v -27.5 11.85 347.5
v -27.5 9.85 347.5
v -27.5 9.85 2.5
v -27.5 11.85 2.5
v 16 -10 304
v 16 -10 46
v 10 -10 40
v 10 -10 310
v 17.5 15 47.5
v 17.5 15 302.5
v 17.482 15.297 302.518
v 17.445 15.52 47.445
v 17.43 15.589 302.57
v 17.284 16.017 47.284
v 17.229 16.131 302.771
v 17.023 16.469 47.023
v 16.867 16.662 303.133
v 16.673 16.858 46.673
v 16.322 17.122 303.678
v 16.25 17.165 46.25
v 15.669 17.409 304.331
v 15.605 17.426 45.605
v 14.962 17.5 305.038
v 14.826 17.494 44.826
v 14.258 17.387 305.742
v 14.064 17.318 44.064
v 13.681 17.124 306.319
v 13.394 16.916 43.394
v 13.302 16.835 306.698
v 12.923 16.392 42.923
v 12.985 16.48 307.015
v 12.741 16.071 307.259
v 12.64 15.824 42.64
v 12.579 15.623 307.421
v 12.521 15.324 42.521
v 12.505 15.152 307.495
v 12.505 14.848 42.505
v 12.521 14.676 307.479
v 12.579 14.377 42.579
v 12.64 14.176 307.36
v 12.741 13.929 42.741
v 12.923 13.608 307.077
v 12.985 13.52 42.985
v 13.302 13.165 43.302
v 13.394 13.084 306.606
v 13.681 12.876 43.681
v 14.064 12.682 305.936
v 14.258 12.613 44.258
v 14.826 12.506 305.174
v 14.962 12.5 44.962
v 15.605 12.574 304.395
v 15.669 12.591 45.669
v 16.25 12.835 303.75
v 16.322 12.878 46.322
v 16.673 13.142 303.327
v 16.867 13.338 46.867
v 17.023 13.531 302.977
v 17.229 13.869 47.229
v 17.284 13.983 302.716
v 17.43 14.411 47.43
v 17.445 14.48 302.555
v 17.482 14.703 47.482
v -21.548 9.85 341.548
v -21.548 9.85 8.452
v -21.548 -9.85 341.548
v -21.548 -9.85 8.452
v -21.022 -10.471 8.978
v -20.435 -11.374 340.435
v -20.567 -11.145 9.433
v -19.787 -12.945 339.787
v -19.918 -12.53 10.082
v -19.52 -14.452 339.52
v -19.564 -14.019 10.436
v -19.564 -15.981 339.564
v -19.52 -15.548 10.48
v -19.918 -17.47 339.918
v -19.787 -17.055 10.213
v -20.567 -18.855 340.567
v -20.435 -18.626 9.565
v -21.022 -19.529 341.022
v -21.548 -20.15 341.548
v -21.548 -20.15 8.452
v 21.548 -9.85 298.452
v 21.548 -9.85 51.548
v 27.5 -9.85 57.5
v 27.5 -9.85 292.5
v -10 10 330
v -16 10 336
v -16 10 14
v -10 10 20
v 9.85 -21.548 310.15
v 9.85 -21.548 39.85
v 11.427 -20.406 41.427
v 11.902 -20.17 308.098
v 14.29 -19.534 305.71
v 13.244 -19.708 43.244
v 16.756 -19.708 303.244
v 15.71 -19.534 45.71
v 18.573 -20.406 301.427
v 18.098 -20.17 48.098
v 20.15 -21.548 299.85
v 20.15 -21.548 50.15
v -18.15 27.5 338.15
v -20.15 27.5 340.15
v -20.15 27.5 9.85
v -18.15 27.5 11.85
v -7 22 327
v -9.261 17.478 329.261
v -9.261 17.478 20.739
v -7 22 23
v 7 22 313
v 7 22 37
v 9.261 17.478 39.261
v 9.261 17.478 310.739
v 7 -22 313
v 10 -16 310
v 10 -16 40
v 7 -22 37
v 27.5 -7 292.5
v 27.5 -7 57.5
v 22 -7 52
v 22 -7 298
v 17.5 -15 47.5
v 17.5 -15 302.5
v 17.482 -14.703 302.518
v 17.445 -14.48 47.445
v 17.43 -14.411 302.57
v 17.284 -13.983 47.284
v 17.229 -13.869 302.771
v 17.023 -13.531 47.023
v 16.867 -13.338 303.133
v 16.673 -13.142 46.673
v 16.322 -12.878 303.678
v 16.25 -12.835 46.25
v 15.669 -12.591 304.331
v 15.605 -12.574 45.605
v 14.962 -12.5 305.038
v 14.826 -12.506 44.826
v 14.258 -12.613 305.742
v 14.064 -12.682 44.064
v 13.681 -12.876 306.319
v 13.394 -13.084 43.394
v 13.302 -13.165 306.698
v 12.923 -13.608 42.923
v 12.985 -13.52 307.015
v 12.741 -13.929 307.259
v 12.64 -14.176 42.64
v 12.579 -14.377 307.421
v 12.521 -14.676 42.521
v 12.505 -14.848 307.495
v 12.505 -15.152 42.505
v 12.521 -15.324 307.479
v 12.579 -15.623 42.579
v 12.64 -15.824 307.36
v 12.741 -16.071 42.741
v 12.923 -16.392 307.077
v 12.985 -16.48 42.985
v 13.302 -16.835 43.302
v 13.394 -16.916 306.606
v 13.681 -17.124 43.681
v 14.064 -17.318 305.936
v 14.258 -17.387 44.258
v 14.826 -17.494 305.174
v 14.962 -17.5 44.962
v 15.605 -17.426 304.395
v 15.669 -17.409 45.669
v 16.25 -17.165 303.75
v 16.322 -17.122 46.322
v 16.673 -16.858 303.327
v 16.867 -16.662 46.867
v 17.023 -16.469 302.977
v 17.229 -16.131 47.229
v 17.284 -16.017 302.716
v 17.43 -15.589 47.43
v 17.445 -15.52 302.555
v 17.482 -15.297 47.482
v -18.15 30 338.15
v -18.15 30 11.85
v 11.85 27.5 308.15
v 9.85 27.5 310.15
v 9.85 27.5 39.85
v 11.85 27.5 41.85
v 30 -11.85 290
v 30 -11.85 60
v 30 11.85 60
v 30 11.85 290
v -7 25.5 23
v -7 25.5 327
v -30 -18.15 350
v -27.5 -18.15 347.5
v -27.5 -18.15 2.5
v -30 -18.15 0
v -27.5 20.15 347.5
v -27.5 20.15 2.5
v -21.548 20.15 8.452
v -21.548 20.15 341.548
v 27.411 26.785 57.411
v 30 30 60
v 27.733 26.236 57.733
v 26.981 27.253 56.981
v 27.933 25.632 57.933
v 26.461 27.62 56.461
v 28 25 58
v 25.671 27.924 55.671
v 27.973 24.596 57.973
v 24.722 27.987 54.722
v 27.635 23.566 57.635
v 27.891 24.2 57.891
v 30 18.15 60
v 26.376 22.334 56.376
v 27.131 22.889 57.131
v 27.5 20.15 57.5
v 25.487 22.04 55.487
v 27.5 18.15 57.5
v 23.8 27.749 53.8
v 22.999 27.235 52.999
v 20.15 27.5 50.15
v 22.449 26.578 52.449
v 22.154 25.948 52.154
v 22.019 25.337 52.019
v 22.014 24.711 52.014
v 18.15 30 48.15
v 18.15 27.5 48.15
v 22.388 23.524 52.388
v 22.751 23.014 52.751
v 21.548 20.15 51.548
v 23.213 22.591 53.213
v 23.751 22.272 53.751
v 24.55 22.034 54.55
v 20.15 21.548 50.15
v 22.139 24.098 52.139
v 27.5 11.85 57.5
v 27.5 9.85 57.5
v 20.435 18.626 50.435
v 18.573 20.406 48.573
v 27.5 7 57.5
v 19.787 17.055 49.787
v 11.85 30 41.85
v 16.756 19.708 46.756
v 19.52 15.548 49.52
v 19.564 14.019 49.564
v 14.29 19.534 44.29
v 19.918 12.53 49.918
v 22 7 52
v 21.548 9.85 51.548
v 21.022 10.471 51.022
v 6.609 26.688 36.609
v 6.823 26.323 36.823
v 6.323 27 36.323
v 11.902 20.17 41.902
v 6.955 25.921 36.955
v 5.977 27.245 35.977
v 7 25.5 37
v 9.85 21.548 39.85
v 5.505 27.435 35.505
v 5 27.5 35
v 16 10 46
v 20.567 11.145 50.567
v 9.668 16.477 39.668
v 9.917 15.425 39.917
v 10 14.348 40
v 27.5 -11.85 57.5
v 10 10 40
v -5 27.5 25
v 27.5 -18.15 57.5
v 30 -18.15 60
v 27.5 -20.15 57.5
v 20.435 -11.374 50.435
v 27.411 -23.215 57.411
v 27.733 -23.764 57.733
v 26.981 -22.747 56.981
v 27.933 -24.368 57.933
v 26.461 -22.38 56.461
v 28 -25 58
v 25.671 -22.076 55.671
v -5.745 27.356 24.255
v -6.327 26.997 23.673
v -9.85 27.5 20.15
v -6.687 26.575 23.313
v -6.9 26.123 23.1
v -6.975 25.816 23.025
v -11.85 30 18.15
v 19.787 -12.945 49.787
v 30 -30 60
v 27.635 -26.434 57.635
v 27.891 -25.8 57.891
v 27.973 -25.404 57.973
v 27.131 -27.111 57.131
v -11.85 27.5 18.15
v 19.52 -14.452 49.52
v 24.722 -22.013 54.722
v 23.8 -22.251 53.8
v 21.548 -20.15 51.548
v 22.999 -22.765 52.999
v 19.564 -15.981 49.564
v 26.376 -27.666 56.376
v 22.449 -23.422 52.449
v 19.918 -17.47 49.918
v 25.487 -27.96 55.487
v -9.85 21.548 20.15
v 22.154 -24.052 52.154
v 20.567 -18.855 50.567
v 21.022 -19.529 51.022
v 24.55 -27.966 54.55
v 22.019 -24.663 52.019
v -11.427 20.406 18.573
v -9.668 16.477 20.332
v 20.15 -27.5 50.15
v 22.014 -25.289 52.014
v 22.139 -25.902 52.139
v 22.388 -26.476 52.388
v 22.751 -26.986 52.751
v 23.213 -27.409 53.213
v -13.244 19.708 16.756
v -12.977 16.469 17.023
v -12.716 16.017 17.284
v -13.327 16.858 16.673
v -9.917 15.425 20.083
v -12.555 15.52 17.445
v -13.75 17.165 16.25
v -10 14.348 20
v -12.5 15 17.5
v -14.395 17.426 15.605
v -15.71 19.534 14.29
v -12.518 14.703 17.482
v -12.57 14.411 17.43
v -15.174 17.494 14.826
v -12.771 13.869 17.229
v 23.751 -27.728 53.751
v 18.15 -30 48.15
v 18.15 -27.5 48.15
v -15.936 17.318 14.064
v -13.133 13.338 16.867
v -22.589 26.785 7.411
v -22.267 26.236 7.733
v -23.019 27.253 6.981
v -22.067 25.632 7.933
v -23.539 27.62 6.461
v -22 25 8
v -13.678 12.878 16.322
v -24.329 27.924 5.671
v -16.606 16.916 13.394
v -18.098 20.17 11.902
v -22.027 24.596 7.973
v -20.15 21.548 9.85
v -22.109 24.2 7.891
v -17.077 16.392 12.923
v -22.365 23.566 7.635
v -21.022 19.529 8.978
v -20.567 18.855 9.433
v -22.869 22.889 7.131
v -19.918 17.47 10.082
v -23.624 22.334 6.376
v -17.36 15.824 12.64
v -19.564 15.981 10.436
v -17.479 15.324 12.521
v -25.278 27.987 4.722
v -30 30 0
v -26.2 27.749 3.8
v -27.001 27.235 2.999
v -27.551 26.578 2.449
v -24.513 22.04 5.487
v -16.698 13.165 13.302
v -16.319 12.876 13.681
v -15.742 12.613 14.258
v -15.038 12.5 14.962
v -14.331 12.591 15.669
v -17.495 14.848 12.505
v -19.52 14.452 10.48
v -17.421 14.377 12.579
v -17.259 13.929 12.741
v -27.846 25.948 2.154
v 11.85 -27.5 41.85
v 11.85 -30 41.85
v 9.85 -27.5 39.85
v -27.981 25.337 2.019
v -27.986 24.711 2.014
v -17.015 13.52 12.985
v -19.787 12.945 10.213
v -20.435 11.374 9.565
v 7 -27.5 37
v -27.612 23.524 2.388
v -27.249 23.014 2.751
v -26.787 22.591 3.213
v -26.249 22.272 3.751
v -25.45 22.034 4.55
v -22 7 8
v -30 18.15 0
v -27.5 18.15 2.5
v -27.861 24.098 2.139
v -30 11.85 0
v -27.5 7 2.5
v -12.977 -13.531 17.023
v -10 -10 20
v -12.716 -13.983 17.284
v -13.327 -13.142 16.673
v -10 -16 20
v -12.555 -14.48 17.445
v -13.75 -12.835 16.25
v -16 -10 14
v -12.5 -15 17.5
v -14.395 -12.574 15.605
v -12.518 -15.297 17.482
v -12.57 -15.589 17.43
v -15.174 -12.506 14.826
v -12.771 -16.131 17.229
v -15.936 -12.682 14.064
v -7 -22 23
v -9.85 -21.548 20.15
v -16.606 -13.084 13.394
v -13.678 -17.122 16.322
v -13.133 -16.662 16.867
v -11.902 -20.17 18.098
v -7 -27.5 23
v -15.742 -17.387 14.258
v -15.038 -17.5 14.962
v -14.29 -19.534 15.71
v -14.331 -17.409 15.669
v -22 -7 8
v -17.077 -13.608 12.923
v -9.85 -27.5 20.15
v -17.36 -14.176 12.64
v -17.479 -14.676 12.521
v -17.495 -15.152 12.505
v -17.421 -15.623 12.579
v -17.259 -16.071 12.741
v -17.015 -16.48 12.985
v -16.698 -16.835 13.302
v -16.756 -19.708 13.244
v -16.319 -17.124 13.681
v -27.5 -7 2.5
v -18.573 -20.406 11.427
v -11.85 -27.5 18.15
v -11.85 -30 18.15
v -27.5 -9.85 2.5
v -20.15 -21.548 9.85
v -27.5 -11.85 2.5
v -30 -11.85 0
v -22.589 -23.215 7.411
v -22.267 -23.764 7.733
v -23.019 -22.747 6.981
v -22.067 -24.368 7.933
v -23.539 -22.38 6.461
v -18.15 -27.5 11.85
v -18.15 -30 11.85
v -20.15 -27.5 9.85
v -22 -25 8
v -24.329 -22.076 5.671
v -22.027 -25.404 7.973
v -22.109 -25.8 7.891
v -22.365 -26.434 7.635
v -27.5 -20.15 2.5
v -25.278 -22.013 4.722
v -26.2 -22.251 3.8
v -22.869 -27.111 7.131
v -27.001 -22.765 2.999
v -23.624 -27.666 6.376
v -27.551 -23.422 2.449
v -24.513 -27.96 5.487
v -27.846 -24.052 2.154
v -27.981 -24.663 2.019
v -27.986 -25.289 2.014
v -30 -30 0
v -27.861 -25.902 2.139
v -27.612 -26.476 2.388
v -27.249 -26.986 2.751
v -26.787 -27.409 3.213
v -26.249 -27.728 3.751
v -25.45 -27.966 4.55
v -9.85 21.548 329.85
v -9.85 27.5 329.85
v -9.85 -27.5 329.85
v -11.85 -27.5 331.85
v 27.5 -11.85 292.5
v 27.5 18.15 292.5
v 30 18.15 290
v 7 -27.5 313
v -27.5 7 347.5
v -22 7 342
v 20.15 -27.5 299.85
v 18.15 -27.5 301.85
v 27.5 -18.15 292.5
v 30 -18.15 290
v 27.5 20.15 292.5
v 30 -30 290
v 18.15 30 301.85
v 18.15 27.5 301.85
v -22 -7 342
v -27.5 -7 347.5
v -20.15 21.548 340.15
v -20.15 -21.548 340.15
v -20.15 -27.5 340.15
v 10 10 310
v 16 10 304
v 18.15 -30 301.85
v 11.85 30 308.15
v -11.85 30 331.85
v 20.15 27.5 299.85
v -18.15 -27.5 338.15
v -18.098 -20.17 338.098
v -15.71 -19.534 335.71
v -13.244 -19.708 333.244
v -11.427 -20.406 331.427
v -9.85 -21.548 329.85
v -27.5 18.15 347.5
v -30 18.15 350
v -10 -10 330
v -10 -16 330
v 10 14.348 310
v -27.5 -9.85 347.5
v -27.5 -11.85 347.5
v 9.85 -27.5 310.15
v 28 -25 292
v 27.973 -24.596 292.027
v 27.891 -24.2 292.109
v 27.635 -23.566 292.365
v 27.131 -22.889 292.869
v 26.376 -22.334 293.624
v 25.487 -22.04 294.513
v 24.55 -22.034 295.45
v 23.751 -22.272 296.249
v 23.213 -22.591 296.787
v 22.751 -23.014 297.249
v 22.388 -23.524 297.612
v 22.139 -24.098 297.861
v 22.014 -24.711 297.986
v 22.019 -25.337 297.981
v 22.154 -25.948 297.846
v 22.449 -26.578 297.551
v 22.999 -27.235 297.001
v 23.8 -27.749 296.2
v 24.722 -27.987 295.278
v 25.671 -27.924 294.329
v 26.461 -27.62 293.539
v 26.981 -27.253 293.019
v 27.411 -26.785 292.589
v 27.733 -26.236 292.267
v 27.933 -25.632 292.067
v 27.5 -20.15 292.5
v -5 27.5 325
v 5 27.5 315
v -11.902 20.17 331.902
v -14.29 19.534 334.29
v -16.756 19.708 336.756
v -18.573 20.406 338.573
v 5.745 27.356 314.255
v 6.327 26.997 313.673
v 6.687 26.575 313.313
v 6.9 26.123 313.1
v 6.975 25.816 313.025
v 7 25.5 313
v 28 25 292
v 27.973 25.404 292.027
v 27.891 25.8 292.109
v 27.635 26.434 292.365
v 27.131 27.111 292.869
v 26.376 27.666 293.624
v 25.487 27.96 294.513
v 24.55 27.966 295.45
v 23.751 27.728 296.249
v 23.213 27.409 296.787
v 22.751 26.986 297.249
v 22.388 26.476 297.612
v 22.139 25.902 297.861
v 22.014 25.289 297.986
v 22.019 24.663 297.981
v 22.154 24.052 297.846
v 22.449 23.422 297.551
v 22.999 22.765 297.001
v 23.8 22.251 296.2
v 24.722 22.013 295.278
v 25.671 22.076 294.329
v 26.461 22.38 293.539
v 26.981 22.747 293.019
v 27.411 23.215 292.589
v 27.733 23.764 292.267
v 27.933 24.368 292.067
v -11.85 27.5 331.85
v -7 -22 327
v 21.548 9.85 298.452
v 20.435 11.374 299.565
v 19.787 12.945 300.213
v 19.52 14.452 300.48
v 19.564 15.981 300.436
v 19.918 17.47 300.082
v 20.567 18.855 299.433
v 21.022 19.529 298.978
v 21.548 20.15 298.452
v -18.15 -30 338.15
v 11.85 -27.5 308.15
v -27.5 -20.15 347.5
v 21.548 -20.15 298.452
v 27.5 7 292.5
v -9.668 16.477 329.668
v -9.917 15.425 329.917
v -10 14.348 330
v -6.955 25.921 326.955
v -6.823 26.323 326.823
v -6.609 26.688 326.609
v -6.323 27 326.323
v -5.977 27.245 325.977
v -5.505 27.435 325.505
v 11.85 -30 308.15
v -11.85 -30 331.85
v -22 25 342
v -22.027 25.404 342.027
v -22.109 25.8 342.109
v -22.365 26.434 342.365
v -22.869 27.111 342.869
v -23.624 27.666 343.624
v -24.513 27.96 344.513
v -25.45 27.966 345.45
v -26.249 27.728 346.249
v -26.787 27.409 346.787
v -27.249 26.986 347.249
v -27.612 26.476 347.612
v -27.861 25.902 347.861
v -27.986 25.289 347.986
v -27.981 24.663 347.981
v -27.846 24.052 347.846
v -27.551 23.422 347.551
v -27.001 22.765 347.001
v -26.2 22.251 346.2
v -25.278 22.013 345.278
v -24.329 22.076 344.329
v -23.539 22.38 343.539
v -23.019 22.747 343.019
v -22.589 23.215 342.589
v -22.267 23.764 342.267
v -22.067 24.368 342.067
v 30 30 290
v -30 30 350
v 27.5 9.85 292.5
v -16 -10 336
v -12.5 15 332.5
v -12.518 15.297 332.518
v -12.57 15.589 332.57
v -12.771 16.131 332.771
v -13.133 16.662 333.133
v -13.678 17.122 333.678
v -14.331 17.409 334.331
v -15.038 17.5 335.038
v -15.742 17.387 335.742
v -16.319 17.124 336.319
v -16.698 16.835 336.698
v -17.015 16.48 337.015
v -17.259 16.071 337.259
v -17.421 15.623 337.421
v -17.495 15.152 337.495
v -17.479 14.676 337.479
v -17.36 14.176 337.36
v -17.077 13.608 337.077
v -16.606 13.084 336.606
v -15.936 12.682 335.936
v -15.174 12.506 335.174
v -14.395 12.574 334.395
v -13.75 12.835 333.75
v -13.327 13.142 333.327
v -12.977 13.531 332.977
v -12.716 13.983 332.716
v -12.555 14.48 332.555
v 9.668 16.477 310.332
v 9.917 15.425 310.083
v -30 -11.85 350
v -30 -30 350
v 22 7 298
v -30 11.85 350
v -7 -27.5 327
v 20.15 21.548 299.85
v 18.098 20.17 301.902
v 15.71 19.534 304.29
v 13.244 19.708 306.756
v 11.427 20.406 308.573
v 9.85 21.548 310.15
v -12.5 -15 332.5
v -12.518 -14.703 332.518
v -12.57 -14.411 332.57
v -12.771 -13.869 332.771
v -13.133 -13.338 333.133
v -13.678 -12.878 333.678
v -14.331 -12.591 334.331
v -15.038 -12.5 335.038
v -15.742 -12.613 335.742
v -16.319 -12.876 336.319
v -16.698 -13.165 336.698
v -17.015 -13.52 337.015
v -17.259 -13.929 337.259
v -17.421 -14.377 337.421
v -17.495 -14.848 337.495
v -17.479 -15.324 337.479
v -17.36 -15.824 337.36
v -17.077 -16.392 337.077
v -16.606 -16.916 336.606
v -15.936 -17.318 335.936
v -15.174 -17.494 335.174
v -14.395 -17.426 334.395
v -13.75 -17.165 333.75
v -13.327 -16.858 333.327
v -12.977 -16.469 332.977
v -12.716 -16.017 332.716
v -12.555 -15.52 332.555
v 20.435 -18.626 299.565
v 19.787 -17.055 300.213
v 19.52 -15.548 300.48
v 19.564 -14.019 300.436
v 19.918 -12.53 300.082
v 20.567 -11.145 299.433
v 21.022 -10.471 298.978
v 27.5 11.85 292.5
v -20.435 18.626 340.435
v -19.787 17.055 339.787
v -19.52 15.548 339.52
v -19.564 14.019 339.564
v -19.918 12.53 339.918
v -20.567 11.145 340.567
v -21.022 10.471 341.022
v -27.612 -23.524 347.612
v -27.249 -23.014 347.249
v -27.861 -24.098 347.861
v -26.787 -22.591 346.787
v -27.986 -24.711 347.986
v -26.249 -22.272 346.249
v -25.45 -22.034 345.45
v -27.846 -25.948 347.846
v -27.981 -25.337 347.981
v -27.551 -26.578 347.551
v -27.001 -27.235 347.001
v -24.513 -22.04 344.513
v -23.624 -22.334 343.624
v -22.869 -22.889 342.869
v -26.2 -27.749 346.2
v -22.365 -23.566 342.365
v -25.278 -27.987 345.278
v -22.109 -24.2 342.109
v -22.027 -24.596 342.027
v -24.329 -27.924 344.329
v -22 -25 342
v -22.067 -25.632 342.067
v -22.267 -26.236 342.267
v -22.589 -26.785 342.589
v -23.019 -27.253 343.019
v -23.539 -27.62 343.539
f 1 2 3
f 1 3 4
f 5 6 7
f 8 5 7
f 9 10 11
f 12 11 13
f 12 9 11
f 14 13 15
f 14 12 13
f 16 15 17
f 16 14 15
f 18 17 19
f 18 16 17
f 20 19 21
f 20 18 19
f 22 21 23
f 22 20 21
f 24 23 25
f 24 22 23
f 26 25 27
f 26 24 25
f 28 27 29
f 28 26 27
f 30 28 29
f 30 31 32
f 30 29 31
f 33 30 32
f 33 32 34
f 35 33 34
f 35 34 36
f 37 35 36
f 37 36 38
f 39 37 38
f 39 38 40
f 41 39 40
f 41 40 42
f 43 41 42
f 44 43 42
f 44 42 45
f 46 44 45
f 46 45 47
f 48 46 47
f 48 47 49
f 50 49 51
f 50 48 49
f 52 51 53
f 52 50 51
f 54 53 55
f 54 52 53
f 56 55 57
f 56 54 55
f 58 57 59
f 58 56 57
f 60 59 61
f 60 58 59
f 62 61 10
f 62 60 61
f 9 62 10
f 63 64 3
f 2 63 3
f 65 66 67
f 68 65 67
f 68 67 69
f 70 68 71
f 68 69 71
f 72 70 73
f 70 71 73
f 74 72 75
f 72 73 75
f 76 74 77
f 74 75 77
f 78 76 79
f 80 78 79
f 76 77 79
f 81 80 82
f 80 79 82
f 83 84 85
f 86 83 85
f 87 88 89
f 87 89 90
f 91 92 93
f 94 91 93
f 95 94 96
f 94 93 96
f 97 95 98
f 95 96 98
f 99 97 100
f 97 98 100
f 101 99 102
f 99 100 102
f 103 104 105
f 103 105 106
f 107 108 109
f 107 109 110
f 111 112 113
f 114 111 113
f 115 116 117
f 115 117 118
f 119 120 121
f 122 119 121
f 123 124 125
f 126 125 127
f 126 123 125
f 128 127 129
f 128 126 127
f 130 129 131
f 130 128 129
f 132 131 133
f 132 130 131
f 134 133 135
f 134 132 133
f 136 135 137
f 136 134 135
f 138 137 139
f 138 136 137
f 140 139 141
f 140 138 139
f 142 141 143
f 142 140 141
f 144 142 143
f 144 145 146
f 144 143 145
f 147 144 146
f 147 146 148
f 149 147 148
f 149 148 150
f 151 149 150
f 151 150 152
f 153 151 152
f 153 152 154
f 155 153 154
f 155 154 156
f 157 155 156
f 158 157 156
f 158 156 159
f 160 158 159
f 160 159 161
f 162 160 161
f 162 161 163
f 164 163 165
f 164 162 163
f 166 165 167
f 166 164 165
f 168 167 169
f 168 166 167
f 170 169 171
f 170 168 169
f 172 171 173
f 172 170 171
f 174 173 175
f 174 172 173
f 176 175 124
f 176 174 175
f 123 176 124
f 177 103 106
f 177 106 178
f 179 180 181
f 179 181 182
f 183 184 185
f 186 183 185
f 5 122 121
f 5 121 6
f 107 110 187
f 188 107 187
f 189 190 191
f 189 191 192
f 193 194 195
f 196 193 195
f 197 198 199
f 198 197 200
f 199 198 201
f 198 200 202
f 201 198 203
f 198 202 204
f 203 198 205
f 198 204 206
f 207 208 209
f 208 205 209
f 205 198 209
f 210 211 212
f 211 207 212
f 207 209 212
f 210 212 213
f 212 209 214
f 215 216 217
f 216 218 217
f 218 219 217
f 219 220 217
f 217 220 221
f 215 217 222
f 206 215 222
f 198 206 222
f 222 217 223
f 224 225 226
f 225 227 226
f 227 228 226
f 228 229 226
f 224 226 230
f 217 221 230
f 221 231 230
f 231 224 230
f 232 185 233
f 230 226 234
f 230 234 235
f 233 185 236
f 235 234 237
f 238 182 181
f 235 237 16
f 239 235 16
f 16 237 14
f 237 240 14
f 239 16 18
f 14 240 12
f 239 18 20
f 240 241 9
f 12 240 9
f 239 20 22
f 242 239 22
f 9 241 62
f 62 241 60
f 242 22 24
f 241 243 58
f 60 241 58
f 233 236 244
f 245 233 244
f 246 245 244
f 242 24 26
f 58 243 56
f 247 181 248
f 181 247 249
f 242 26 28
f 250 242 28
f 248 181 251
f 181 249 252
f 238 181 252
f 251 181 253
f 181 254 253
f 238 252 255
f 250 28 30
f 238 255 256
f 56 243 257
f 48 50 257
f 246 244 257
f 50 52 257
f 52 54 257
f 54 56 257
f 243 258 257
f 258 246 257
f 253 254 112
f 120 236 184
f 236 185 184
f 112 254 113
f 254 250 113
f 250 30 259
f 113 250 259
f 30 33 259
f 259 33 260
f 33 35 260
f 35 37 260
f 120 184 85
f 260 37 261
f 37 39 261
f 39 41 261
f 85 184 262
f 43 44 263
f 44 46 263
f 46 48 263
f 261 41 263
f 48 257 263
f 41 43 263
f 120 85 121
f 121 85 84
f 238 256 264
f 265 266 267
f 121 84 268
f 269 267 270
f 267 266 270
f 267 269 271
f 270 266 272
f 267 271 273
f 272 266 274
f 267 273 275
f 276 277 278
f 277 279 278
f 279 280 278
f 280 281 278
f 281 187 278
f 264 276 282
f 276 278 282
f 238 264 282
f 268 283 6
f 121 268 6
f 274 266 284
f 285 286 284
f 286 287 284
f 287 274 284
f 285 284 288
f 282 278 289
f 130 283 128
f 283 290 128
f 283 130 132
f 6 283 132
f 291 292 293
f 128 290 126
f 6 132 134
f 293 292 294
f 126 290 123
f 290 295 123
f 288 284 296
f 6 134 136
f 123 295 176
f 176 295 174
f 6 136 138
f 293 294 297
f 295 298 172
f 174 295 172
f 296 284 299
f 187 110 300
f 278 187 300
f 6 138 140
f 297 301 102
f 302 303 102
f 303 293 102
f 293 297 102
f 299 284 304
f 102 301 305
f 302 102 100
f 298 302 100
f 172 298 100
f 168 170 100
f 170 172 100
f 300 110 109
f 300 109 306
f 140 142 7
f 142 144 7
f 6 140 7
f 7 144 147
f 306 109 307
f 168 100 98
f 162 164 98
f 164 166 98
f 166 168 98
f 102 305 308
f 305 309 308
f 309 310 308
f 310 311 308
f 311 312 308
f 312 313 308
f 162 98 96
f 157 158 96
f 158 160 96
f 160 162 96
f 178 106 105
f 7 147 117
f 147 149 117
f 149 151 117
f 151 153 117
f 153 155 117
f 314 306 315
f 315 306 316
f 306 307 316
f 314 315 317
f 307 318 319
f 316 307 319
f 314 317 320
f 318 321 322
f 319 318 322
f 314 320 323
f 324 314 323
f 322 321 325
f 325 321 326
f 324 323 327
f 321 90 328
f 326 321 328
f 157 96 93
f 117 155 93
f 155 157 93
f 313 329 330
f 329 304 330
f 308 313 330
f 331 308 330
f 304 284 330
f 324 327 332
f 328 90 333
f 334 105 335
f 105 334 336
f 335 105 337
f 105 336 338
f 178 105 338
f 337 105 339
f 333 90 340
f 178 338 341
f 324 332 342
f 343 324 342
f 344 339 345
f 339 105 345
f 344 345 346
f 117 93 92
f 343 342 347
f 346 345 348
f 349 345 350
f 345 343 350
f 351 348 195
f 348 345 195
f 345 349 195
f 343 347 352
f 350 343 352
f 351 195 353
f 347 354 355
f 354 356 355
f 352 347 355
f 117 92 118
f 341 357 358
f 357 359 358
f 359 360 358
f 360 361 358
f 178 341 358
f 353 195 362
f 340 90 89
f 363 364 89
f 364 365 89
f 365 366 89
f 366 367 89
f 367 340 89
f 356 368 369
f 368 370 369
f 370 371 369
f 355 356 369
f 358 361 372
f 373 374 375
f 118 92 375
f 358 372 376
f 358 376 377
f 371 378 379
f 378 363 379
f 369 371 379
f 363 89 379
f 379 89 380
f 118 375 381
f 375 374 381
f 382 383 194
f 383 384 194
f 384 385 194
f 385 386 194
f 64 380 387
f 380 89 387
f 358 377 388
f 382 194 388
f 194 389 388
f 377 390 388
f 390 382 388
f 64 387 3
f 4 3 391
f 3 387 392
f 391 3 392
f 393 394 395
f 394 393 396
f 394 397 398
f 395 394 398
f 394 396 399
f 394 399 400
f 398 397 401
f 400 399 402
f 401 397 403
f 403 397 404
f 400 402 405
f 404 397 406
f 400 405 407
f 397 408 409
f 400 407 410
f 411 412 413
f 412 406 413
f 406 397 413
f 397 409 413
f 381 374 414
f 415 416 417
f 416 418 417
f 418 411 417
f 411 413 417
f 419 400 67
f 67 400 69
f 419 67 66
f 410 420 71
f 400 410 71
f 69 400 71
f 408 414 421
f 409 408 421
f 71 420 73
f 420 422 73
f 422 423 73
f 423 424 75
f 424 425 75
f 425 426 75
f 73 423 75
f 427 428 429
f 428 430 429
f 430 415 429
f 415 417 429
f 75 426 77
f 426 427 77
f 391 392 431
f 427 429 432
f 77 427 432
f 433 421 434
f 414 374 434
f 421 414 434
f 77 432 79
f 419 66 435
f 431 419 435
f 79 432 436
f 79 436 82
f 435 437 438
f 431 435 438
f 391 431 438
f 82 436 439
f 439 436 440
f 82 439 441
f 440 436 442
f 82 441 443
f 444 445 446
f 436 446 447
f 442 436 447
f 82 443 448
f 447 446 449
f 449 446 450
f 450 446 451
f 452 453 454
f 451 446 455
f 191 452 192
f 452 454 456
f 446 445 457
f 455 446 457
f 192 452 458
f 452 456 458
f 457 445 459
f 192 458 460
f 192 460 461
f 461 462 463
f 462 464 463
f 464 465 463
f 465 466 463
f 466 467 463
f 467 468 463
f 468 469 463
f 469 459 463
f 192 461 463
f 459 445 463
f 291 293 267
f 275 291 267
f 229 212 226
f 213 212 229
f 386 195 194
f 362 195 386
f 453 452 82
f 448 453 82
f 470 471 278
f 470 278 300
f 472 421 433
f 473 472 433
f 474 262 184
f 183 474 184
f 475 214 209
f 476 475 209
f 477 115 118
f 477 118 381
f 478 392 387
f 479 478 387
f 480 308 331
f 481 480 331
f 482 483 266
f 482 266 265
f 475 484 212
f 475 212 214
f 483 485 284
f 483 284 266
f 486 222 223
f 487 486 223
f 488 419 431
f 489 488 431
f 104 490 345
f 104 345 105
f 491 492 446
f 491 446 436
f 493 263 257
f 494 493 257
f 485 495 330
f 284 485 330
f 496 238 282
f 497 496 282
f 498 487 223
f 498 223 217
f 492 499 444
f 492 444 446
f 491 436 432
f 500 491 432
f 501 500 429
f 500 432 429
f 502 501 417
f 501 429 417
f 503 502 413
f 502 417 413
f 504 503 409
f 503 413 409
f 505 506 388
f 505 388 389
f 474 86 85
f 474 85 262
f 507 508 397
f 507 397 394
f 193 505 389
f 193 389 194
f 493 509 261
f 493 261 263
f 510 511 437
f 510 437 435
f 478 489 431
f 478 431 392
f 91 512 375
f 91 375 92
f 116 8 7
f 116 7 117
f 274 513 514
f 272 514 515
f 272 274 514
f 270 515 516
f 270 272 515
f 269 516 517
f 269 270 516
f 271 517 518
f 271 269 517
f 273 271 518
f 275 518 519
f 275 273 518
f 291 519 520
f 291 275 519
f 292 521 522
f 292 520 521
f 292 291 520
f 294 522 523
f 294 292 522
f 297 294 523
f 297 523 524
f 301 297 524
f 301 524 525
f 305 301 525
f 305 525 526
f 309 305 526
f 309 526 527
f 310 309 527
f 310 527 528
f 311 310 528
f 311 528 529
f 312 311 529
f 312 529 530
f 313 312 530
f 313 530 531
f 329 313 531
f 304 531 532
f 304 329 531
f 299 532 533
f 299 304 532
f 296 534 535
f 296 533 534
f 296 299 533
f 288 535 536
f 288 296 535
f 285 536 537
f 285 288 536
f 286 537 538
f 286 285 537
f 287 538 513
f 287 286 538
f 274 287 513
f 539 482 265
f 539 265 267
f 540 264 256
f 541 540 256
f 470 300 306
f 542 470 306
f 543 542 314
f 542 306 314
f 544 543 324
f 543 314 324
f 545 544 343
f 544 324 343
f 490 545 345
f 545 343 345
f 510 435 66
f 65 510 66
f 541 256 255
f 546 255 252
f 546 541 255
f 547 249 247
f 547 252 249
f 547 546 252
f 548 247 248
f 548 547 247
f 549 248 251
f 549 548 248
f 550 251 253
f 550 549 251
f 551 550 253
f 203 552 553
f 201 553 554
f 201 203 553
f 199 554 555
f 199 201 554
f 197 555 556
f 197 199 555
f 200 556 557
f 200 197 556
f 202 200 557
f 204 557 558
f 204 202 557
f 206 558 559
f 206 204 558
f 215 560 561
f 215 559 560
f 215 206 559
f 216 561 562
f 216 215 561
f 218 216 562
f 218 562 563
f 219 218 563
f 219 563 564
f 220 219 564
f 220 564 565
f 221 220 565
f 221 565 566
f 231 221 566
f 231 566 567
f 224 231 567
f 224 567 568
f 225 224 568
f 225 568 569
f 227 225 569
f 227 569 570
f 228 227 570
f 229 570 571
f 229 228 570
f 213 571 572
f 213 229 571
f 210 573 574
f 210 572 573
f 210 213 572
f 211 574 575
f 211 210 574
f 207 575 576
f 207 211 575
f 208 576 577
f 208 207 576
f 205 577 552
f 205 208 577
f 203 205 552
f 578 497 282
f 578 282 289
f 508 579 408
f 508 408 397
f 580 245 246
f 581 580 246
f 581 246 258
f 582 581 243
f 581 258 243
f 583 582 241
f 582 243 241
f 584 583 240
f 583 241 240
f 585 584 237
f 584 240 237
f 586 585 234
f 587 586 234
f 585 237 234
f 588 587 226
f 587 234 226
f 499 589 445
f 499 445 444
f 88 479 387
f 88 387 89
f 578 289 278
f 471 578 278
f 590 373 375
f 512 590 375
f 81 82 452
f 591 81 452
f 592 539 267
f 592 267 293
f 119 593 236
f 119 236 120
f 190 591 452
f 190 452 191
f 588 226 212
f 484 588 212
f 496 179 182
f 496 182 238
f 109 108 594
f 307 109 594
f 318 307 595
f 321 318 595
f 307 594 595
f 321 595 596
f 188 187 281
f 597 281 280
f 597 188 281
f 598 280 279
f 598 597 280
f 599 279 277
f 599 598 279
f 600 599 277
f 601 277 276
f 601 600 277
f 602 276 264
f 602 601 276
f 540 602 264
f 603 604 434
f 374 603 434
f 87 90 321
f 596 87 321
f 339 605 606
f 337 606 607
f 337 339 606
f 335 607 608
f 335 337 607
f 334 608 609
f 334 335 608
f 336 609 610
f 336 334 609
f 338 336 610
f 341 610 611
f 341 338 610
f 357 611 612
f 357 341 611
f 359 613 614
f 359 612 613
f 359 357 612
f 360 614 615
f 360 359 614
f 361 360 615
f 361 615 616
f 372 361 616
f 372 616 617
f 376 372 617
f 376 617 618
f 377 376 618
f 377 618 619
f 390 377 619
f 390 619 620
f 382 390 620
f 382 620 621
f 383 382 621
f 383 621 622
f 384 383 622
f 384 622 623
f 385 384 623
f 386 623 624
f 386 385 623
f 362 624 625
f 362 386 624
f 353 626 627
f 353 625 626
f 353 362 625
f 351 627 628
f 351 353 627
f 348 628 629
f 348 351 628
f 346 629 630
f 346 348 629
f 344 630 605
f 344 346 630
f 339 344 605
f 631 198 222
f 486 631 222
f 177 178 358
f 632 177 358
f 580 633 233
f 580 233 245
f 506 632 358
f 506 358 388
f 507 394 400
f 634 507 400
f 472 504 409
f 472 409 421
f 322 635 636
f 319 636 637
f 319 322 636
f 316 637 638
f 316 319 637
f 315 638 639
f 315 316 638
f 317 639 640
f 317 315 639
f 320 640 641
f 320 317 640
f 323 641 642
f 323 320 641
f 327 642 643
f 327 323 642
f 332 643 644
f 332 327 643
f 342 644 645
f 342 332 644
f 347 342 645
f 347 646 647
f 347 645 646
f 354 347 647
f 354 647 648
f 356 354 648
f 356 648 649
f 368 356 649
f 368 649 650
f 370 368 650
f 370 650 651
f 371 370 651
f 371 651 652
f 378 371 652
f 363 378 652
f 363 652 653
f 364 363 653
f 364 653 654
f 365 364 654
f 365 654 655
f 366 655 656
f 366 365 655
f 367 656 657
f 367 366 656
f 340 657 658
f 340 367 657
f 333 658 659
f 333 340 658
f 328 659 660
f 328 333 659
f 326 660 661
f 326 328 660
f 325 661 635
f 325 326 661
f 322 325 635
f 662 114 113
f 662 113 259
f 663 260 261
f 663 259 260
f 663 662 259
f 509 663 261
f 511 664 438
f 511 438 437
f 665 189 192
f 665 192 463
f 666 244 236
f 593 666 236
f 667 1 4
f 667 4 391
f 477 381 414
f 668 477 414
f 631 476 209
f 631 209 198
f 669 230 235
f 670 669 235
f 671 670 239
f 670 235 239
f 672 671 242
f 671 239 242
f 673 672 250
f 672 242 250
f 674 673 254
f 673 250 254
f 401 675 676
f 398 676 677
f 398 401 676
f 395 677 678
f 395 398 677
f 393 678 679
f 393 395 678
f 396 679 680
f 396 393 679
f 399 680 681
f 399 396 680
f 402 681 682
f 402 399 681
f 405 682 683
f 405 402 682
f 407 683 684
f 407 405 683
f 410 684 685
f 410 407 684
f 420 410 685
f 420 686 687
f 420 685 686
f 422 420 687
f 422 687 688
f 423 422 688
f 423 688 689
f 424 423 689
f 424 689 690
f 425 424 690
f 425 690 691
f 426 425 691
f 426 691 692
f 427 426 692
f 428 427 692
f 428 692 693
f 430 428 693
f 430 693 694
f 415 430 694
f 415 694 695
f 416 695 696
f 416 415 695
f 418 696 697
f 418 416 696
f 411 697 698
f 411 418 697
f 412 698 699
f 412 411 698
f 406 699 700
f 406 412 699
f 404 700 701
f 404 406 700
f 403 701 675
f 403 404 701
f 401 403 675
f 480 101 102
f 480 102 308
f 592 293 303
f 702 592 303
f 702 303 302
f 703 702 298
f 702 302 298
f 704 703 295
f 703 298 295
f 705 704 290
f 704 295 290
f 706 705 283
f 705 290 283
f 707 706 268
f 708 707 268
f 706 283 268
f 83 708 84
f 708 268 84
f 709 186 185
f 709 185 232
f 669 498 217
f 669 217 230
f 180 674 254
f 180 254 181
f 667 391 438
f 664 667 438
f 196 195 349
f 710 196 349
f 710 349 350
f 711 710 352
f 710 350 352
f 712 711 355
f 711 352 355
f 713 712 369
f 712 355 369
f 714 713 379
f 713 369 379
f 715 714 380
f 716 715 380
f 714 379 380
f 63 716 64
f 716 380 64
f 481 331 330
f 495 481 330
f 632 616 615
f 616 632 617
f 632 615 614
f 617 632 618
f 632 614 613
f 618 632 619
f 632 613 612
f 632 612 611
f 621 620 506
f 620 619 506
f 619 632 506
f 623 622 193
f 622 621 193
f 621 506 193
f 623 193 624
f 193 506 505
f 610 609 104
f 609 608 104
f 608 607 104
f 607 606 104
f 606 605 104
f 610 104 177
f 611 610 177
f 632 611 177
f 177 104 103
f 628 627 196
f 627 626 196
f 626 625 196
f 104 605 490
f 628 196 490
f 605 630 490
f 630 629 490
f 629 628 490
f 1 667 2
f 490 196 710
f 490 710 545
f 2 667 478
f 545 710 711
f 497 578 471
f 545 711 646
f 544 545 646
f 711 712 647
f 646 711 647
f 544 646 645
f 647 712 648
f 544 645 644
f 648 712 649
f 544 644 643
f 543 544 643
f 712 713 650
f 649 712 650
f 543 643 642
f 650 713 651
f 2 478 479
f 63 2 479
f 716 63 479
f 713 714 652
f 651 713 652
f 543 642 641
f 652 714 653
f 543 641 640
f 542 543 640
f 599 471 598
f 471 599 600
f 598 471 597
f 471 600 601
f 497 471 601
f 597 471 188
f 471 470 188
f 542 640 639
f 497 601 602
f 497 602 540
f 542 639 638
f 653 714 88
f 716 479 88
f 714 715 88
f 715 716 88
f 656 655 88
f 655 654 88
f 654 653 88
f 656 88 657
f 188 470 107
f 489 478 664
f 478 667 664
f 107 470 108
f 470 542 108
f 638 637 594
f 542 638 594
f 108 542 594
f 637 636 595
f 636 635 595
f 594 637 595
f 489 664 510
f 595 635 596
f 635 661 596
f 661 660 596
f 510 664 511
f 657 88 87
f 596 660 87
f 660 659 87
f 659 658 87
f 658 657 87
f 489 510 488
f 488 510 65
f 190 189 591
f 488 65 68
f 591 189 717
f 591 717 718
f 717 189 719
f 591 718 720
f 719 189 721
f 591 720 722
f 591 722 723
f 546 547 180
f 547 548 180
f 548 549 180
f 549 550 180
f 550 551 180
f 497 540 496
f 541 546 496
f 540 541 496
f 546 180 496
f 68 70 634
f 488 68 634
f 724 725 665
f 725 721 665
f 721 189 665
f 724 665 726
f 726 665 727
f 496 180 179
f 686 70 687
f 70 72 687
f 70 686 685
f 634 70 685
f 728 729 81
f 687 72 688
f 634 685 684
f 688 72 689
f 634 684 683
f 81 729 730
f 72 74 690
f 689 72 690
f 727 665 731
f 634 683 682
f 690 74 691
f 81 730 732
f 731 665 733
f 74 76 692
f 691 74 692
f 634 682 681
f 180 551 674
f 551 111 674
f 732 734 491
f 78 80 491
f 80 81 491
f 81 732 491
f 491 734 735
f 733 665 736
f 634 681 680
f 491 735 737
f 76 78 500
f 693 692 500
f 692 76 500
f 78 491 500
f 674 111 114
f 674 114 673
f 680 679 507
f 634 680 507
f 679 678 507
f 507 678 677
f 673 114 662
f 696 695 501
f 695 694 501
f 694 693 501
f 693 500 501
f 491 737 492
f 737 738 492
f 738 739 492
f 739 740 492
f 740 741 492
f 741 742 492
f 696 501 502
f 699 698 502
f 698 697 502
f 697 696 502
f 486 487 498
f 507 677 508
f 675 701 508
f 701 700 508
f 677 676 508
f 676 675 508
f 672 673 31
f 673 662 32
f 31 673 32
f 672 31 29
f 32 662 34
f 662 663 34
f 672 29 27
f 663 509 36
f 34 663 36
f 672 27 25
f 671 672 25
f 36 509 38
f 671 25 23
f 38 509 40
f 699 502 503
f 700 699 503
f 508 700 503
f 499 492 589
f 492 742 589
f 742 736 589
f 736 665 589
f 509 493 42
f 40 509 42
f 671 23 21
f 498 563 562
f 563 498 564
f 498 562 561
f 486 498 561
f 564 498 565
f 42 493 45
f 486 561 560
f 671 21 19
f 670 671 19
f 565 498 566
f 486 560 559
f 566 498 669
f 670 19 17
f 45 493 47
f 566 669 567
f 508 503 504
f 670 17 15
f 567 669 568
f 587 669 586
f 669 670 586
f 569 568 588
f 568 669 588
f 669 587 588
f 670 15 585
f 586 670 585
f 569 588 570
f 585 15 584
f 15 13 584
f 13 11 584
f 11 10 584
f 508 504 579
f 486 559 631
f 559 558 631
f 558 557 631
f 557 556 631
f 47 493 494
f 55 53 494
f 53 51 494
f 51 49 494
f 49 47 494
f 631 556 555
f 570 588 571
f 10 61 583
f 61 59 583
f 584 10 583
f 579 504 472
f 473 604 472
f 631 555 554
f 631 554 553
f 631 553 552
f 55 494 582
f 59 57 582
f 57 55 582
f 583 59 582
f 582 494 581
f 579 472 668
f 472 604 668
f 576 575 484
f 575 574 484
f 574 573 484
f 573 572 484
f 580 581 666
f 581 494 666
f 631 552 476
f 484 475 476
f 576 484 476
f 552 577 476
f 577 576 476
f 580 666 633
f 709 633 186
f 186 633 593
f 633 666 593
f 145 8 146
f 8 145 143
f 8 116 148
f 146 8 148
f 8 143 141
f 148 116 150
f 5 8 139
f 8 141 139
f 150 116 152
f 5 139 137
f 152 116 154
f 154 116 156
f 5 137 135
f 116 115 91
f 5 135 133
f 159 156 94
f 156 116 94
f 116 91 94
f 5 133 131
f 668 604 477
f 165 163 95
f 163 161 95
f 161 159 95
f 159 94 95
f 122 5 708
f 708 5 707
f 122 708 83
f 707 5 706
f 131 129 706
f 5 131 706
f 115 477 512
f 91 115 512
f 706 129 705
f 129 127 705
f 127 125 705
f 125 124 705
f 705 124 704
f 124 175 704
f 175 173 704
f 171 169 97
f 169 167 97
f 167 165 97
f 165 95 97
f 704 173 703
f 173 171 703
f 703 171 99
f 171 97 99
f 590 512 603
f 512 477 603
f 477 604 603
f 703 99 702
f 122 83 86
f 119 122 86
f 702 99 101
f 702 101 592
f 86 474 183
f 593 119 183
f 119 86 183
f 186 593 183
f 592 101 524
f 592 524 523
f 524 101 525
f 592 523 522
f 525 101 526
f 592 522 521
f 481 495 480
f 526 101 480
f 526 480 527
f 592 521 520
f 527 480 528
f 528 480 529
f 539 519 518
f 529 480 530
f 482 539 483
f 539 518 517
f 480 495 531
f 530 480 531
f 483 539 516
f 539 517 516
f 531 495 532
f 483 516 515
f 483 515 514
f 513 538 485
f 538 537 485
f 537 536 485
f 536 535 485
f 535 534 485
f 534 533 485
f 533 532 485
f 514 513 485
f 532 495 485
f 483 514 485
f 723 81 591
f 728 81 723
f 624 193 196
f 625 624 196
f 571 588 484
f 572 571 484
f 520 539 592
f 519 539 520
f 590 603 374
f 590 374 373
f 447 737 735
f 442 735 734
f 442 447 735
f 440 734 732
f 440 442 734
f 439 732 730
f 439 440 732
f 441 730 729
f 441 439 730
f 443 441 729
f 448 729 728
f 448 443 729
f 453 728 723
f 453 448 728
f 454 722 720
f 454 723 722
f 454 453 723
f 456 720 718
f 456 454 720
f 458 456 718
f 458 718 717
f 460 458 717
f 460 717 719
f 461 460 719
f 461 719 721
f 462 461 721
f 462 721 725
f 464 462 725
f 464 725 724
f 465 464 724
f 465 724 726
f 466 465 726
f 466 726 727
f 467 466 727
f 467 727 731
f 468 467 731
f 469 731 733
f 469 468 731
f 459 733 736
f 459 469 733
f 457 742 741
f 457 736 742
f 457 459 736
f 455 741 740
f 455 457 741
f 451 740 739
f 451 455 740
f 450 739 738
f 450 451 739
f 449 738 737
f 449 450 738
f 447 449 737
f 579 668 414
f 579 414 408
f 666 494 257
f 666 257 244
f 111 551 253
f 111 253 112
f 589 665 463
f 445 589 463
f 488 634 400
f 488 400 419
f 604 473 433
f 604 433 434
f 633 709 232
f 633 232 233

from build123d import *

# Parameters (mm, degrees)
F0_R     = 3
F0_R_2   = 2.5
F1_DEPTH = 350
F2_R     = 2
F3_R     = 7
F5_DEPTH = 60


# Not quite as in the source:
# - a feature names something its author has since deleted; it is built from what else it names


with BuildPart() as f1:
    # F0 (on Top) → F1 (new body)
    with BuildSketch(Plane.XY):
        with BuildLine():
            Line((18.15, -30), (30, -30))
            Line((30, -30), (30, -18.15))
            Line((30, -18.15), (27.5, -18.15))
            Line((27.5, -18.15), (27.5, -20.15))
            Line((27.5, -20.15), (21.5477069044, -20.15))
            ThreePointArc((21.5477069044, -20.15), (19.5, -15), (21.5477069044, -9.85))
            Line((21.5477069044, -9.85), (27.5, -9.85))
            Line((27.5, -9.85), (27.5, -11.85))
            Line((27.5, -11.85), (30, -11.85))
            Line((30, -11.85), (30, 11.85))
            Line((30, 11.85), (27.5, 11.85))
            Line((27.5, 11.85), (27.5, 9.85))
            Line((27.5, 9.85), (21.5477069044, 9.85))
            ThreePointArc((21.5477069044, 9.85), (19.5, 15), (21.5477069044, 20.15))
            Line((21.5477069044, 20.15), (27.5, 20.15))
            Line((27.5, 20.15), (27.5, 18.15))
            Line((27.5, 18.15), (30, 18.15))
            Line((30, 18.15), (30, 30))
            Line((30, 30), (18.15, 30))
            Line((18.15, 30), (18.15, 27.5))
            Line((18.15, 27.5), (20.15, 27.5))
            Line((20.15, 27.5), (20.15, 21.5477069044))
            ThreePointArc((20.15, 21.5477069044), (15, 19.5), (9.85, 21.5477069044))
            Line((9.85, 21.5477069044), (9.85, 27.5))
            Line((9.85, 27.5), (11.85, 27.5))
            Line((11.85, 27.5), (11.85, 30))
            Line((11.85, 30), (-11.85, 30))
            Line((-11.85, 30), (-11.85, 27.5))
            Line((-11.85, 27.5), (-9.85, 27.5))
            Line((-9.85, 27.5), (-9.85, 21.5477069044))
            ThreePointArc((-9.85, 21.5477069044), (-15, 19.5), (-20.15, 21.5477069044))
            Line((-20.15, 21.5477069044), (-20.15, 27.5))
            Line((-20.15, 27.5), (-18.15, 27.5))
            Line((-18.15, 27.5), (-18.15, 30))
            Line((-18.15, 30), (-30, 30))
            Line((-30, 30), (-30, 18.15))
            Line((-30, 18.15), (-27.5, 18.15))
            Line((-27.5, 18.15), (-27.5, 20.15))
            Line((-27.5, 20.15), (-21.5477069044, 20.15))
            ThreePointArc((-21.5477069044, 20.15), (-19.5, 15), (-21.5477069044, 9.85))
            Line((-21.5477069044, 9.85), (-27.5, 9.85))
            Line((-27.5, 9.85), (-27.5, 11.85))
            Line((-27.5, 11.85), (-30, 11.85))
            Line((-30, 11.85), (-30, -11.85))
            Line((-30, -11.85), (-27.5, -11.85))
            Line((-27.5, -11.85), (-27.5, -9.85))
            Line((-27.5, -9.85), (-21.5477069044, -9.85))
            ThreePointArc((-21.5477069044, -9.85), (-19.5, -15), (-21.5477069044, -20.15))
            Line((-21.5477069044, -20.15), (-27.5, -20.15))
            Line((-27.5, -20.15), (-27.5, -18.15))
            Line((-27.5, -18.15), (-30, -18.15))
            Line((-30, -18.15), (-30, -30))
            Line((-30, -30), (-18.15, -30))
            Line((-18.15, -30), (-18.15, -27.5))
            Line((-18.15, -27.5), (-20.15, -27.5))
            Line((-20.15, -27.5), (-20.15, -21.5477069044))
            ThreePointArc((-20.15, -21.5477069044), (-15, -19.5), (-9.85, -21.5477069044))
            Line((-9.85, -21.5477069044), (-9.85, -27.5))
            Line((-9.85, -27.5), (-11.85, -27.5))
            Line((-11.85, -27.5), (-11.85, -30))
            Line((-11.85, -30), (11.85, -30))
            Line((11.85, -30), (11.85, -27.5))
            Line((11.85, -27.5), (9.85, -27.5))
            Line((9.85, -27.5), (9.85, -21.5477069044))
            ThreePointArc((9.85, -21.5477069044), (15, -19.5), (20.15, -21.5477069044))
            Line((20.15, -21.5477069044), (20.15, -27.5))
            Line((20.15, -27.5), (18.15, -27.5))
            Line((18.15, -27.5), (18.15, -30))
        make_face()
        with Locations((-25, -25)):
            Circle(F0_R, mode=Mode.SUBTRACT)
        with Locations((-15, -15)):
            Circle(F0_R_2, mode=Mode.SUBTRACT)
        with Locations((25, -25)):
            Circle(F0_R, mode=Mode.SUBTRACT)
        with Locations((15, -15)):
            Circle(F0_R_2, mode=Mode.SUBTRACT)
        with Locations((-25, 25)):
            Circle(F0_R, mode=Mode.SUBTRACT)
        with Locations((-15, 15)):
            Circle(F0_R_2, mode=Mode.SUBTRACT)
        Polygon((-7, 22), (-7, 27.5), (0, 27.5), (7, 27.5), (7, 22), (10, 16), (10, 10), (16, 10), (22, 7), (27.5, 7), (27.5, 0), (27.5, -7), (22, -7), (16, -10), (10, -10), (10, -16), (7, -22), (7, -27.5), (0, -27.5), (-7, -27.5), (-7, -22), (-10, -16), (-10, -10), (-16, -10), (-22, -7), (-27.5, -7), (-27.5, 0), (-27.5, 7), (-22, 7), (-16, 10), (-10, 10), (-10, 16), align=None, mode=Mode.SUBTRACT)
        with Locations((15, 15)):
            Circle(F0_R_2, mode=Mode.SUBTRACT)
        with Locations((25, 25)):
            Circle(F0_R, mode=Mode.SUBTRACT)
    extrude(amount=F1_DEPTH)

    # F2
    f2_edges = [f1.edges().sort_by_distance(p)[0] for p in [
        (-7, 27.5, 175),
        (7, 27.5, 175),
    ]]
    fillet(f2_edges, radius=F2_R)

    # F3
    f3_edges = [f1.edges().sort_by_distance(p)[0] for p in [
        (-10, 16, 175),
        (10, 16, 175),
    ]]
    fillet(f3_edges, radius=F3_R)

    # F4 (on face) → F5 (cut)
    with BuildSketch(Plane.XZ.offset(30)):
        Polygon((30, 0), (30, 60), (-30, 0), (-18.15, 0), align=None)
        Polygon((30, 290), (30, 350), (-18.15, 350), (-30, 350), align=None)
    extrude(amount=-F5_DEPTH, mode=Mode.SUBTRACT)


solid = f1.part
